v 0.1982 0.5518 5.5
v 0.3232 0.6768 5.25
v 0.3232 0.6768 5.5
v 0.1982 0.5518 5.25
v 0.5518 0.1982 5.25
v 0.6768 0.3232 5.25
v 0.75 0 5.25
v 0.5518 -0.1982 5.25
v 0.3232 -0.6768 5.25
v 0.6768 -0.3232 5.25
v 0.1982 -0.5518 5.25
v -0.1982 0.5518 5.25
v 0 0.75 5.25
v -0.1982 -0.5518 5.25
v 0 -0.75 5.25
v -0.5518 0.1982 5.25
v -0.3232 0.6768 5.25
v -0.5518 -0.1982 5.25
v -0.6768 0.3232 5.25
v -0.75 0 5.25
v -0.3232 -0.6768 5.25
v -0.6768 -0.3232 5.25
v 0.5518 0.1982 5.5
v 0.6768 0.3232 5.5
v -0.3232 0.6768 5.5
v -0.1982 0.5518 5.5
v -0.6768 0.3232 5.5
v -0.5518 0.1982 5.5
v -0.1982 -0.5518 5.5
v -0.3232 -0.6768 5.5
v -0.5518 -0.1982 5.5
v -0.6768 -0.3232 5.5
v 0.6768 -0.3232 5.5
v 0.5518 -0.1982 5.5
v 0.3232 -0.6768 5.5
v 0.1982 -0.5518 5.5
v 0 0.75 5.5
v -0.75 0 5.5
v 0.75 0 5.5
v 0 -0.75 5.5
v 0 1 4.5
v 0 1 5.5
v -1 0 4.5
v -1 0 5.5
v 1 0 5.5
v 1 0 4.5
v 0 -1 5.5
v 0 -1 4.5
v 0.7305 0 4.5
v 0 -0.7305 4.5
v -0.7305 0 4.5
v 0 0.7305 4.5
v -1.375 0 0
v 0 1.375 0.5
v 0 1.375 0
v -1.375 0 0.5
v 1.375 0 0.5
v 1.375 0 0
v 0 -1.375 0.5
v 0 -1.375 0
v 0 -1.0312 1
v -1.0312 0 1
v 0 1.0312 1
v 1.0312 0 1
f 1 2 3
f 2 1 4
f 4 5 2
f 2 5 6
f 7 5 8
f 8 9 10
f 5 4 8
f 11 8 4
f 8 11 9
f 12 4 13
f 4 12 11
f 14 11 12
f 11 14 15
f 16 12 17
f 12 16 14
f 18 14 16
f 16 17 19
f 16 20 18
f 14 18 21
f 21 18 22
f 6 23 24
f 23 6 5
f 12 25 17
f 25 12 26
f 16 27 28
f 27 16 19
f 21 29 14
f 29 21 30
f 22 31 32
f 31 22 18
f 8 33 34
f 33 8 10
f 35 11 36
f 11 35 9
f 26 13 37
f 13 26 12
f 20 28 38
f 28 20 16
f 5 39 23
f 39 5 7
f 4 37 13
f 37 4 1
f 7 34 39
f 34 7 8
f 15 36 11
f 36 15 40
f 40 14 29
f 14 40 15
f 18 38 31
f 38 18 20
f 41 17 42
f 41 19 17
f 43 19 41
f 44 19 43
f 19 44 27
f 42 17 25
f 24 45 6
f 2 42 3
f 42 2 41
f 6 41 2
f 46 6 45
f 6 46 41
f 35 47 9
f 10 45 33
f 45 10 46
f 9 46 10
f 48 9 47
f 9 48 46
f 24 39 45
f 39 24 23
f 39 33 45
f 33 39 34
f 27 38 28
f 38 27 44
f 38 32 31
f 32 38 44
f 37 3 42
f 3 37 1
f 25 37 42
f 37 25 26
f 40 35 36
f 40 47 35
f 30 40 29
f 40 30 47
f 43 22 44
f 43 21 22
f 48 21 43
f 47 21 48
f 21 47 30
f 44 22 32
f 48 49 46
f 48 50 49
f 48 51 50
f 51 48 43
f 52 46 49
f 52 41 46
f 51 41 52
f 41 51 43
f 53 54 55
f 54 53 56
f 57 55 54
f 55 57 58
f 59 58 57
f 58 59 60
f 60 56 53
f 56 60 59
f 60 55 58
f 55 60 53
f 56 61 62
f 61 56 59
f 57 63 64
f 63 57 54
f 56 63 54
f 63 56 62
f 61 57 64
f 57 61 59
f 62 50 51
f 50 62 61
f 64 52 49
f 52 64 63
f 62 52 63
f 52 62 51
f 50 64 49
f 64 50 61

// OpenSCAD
// FIDE Standards have some flexibility
// https://www.fide.com/FIDE/handbook/Standards_of_Chess_Equipment_and_tournament_venue.pdf
// FIDE Handbook C.02.2.2 Height,weight,proportions
// 	- King – 9.5 cm, 
// 	- Queen – 8.5 cm, 
// 	- Bishop – 7 cm, 
// 	- Knight – 6 cm, 
// 	- Rook – 5.5 cm and 
// 	- Pawn – 5 cm. 
// 	- The diameter of the piece's base should measure 40- 50% of its height.
// 	- These dimensions may differ up to 10% from the above recommendation,
// 		- but the order (e.g. King is higher than Queen etc.) must be kept.
// We are going to transgress C.02.2.3
// FIDE Handbook C.02.3.2 Size of the square and the board
// 	- The side of the square should measure 5 to 6 cm. 
// 	- Referring to 2.2 the side of a square should be at least twice the diameter of a pawn’s base (it means four paws on one square).


// FIDE Standards have some flexibility
// https://www.fide.com/FIDE/handbook/Standards_of_Chess_Equipment_and_tournament_venue.pdf
// FIDE Handbook C.02.2.2 Height,weight,proportions
// 	- King – 9.5 cm, 
// 	- Queen – 8.5 cm, 
// 	- Bishop – 7 cm, 
// 	- Knight – 6 cm, 
// 	- Rook – 5.5 cm and 
// 	- Pawn – 5 cm. 
// 	- The diameter of the piece's base should measure 40- 50% of its height.
// 	- These dimensions may differ up to 10% from the above recommendation,
// 		- but the order (e.g. King is higher than Queen etc.) must be kept.
// We are going to transgress C.02.2.3
// FIDE Handbook C.02.3.2 Size of the square and the board
// 	- The side of the square should measure 5 to 6 cm. 
// 	- Referring to 2.2 the side of a square should be at least twice the diameter of a pawn’s base (it means four paws on one square).

$fn = 4;
total_height = 5.5;
base_diameter = total_height / 2;
base_radius = base_diameter / 2;

// How is the base height dependent on piece height?
base_height = 1;

// The rook has a wider stem
stem_radius = base_radius / 2;
stem_base_radius = base_radius * (3/4);

// I like several different low poly designs for the castle ridges
// I like the ridge going over the corner
// I also like the simplicity of every other face having a ridge
head_radius = 1;
head_height = 1;
stem_height = total_height - base_height - (head_height / 2);

// Can set ridge_count to a coefficient or ratio of $fn or a static number
ridge_count = $fn;
ridge_angle_1 = 360 / ridge_count;
ridge_angle_2 = (360 / ridge_count) / 2;
ridge_width = (head_radius/ridge_count)*2;

// ridge_offset will set the ridges to go over the corners
ridge_offset_check = 1;
ridge_offset = ridge_offset_check * ridge_angle_2;

cylinder(base_height/2, r = base_radius);
translate([0, 0, base_height/2]) 
	cylinder(base_height/2, base_radius, stem_base_radius);
translate([0, 0, base_height])
	cylinder(stem_height, stem_base_radius, stem_radius);
difference() {
	translate([0, 0, total_height - head_height])
		cylinder(head_height, r = head_radius);
	translate([0, 0, total_height - (head_height/4)]) {
		cylinder(head_height, r = head_radius * 0.75);
		for (i = [1:ridge_count]) {
			rotate([0, 0, (i * ridge_angle_1) - ridge_offset])
				translate([0, -(ridge_width / 2), 0])
					cube([head_radius, ridge_width, head_height], false);
		}		
	}
}
